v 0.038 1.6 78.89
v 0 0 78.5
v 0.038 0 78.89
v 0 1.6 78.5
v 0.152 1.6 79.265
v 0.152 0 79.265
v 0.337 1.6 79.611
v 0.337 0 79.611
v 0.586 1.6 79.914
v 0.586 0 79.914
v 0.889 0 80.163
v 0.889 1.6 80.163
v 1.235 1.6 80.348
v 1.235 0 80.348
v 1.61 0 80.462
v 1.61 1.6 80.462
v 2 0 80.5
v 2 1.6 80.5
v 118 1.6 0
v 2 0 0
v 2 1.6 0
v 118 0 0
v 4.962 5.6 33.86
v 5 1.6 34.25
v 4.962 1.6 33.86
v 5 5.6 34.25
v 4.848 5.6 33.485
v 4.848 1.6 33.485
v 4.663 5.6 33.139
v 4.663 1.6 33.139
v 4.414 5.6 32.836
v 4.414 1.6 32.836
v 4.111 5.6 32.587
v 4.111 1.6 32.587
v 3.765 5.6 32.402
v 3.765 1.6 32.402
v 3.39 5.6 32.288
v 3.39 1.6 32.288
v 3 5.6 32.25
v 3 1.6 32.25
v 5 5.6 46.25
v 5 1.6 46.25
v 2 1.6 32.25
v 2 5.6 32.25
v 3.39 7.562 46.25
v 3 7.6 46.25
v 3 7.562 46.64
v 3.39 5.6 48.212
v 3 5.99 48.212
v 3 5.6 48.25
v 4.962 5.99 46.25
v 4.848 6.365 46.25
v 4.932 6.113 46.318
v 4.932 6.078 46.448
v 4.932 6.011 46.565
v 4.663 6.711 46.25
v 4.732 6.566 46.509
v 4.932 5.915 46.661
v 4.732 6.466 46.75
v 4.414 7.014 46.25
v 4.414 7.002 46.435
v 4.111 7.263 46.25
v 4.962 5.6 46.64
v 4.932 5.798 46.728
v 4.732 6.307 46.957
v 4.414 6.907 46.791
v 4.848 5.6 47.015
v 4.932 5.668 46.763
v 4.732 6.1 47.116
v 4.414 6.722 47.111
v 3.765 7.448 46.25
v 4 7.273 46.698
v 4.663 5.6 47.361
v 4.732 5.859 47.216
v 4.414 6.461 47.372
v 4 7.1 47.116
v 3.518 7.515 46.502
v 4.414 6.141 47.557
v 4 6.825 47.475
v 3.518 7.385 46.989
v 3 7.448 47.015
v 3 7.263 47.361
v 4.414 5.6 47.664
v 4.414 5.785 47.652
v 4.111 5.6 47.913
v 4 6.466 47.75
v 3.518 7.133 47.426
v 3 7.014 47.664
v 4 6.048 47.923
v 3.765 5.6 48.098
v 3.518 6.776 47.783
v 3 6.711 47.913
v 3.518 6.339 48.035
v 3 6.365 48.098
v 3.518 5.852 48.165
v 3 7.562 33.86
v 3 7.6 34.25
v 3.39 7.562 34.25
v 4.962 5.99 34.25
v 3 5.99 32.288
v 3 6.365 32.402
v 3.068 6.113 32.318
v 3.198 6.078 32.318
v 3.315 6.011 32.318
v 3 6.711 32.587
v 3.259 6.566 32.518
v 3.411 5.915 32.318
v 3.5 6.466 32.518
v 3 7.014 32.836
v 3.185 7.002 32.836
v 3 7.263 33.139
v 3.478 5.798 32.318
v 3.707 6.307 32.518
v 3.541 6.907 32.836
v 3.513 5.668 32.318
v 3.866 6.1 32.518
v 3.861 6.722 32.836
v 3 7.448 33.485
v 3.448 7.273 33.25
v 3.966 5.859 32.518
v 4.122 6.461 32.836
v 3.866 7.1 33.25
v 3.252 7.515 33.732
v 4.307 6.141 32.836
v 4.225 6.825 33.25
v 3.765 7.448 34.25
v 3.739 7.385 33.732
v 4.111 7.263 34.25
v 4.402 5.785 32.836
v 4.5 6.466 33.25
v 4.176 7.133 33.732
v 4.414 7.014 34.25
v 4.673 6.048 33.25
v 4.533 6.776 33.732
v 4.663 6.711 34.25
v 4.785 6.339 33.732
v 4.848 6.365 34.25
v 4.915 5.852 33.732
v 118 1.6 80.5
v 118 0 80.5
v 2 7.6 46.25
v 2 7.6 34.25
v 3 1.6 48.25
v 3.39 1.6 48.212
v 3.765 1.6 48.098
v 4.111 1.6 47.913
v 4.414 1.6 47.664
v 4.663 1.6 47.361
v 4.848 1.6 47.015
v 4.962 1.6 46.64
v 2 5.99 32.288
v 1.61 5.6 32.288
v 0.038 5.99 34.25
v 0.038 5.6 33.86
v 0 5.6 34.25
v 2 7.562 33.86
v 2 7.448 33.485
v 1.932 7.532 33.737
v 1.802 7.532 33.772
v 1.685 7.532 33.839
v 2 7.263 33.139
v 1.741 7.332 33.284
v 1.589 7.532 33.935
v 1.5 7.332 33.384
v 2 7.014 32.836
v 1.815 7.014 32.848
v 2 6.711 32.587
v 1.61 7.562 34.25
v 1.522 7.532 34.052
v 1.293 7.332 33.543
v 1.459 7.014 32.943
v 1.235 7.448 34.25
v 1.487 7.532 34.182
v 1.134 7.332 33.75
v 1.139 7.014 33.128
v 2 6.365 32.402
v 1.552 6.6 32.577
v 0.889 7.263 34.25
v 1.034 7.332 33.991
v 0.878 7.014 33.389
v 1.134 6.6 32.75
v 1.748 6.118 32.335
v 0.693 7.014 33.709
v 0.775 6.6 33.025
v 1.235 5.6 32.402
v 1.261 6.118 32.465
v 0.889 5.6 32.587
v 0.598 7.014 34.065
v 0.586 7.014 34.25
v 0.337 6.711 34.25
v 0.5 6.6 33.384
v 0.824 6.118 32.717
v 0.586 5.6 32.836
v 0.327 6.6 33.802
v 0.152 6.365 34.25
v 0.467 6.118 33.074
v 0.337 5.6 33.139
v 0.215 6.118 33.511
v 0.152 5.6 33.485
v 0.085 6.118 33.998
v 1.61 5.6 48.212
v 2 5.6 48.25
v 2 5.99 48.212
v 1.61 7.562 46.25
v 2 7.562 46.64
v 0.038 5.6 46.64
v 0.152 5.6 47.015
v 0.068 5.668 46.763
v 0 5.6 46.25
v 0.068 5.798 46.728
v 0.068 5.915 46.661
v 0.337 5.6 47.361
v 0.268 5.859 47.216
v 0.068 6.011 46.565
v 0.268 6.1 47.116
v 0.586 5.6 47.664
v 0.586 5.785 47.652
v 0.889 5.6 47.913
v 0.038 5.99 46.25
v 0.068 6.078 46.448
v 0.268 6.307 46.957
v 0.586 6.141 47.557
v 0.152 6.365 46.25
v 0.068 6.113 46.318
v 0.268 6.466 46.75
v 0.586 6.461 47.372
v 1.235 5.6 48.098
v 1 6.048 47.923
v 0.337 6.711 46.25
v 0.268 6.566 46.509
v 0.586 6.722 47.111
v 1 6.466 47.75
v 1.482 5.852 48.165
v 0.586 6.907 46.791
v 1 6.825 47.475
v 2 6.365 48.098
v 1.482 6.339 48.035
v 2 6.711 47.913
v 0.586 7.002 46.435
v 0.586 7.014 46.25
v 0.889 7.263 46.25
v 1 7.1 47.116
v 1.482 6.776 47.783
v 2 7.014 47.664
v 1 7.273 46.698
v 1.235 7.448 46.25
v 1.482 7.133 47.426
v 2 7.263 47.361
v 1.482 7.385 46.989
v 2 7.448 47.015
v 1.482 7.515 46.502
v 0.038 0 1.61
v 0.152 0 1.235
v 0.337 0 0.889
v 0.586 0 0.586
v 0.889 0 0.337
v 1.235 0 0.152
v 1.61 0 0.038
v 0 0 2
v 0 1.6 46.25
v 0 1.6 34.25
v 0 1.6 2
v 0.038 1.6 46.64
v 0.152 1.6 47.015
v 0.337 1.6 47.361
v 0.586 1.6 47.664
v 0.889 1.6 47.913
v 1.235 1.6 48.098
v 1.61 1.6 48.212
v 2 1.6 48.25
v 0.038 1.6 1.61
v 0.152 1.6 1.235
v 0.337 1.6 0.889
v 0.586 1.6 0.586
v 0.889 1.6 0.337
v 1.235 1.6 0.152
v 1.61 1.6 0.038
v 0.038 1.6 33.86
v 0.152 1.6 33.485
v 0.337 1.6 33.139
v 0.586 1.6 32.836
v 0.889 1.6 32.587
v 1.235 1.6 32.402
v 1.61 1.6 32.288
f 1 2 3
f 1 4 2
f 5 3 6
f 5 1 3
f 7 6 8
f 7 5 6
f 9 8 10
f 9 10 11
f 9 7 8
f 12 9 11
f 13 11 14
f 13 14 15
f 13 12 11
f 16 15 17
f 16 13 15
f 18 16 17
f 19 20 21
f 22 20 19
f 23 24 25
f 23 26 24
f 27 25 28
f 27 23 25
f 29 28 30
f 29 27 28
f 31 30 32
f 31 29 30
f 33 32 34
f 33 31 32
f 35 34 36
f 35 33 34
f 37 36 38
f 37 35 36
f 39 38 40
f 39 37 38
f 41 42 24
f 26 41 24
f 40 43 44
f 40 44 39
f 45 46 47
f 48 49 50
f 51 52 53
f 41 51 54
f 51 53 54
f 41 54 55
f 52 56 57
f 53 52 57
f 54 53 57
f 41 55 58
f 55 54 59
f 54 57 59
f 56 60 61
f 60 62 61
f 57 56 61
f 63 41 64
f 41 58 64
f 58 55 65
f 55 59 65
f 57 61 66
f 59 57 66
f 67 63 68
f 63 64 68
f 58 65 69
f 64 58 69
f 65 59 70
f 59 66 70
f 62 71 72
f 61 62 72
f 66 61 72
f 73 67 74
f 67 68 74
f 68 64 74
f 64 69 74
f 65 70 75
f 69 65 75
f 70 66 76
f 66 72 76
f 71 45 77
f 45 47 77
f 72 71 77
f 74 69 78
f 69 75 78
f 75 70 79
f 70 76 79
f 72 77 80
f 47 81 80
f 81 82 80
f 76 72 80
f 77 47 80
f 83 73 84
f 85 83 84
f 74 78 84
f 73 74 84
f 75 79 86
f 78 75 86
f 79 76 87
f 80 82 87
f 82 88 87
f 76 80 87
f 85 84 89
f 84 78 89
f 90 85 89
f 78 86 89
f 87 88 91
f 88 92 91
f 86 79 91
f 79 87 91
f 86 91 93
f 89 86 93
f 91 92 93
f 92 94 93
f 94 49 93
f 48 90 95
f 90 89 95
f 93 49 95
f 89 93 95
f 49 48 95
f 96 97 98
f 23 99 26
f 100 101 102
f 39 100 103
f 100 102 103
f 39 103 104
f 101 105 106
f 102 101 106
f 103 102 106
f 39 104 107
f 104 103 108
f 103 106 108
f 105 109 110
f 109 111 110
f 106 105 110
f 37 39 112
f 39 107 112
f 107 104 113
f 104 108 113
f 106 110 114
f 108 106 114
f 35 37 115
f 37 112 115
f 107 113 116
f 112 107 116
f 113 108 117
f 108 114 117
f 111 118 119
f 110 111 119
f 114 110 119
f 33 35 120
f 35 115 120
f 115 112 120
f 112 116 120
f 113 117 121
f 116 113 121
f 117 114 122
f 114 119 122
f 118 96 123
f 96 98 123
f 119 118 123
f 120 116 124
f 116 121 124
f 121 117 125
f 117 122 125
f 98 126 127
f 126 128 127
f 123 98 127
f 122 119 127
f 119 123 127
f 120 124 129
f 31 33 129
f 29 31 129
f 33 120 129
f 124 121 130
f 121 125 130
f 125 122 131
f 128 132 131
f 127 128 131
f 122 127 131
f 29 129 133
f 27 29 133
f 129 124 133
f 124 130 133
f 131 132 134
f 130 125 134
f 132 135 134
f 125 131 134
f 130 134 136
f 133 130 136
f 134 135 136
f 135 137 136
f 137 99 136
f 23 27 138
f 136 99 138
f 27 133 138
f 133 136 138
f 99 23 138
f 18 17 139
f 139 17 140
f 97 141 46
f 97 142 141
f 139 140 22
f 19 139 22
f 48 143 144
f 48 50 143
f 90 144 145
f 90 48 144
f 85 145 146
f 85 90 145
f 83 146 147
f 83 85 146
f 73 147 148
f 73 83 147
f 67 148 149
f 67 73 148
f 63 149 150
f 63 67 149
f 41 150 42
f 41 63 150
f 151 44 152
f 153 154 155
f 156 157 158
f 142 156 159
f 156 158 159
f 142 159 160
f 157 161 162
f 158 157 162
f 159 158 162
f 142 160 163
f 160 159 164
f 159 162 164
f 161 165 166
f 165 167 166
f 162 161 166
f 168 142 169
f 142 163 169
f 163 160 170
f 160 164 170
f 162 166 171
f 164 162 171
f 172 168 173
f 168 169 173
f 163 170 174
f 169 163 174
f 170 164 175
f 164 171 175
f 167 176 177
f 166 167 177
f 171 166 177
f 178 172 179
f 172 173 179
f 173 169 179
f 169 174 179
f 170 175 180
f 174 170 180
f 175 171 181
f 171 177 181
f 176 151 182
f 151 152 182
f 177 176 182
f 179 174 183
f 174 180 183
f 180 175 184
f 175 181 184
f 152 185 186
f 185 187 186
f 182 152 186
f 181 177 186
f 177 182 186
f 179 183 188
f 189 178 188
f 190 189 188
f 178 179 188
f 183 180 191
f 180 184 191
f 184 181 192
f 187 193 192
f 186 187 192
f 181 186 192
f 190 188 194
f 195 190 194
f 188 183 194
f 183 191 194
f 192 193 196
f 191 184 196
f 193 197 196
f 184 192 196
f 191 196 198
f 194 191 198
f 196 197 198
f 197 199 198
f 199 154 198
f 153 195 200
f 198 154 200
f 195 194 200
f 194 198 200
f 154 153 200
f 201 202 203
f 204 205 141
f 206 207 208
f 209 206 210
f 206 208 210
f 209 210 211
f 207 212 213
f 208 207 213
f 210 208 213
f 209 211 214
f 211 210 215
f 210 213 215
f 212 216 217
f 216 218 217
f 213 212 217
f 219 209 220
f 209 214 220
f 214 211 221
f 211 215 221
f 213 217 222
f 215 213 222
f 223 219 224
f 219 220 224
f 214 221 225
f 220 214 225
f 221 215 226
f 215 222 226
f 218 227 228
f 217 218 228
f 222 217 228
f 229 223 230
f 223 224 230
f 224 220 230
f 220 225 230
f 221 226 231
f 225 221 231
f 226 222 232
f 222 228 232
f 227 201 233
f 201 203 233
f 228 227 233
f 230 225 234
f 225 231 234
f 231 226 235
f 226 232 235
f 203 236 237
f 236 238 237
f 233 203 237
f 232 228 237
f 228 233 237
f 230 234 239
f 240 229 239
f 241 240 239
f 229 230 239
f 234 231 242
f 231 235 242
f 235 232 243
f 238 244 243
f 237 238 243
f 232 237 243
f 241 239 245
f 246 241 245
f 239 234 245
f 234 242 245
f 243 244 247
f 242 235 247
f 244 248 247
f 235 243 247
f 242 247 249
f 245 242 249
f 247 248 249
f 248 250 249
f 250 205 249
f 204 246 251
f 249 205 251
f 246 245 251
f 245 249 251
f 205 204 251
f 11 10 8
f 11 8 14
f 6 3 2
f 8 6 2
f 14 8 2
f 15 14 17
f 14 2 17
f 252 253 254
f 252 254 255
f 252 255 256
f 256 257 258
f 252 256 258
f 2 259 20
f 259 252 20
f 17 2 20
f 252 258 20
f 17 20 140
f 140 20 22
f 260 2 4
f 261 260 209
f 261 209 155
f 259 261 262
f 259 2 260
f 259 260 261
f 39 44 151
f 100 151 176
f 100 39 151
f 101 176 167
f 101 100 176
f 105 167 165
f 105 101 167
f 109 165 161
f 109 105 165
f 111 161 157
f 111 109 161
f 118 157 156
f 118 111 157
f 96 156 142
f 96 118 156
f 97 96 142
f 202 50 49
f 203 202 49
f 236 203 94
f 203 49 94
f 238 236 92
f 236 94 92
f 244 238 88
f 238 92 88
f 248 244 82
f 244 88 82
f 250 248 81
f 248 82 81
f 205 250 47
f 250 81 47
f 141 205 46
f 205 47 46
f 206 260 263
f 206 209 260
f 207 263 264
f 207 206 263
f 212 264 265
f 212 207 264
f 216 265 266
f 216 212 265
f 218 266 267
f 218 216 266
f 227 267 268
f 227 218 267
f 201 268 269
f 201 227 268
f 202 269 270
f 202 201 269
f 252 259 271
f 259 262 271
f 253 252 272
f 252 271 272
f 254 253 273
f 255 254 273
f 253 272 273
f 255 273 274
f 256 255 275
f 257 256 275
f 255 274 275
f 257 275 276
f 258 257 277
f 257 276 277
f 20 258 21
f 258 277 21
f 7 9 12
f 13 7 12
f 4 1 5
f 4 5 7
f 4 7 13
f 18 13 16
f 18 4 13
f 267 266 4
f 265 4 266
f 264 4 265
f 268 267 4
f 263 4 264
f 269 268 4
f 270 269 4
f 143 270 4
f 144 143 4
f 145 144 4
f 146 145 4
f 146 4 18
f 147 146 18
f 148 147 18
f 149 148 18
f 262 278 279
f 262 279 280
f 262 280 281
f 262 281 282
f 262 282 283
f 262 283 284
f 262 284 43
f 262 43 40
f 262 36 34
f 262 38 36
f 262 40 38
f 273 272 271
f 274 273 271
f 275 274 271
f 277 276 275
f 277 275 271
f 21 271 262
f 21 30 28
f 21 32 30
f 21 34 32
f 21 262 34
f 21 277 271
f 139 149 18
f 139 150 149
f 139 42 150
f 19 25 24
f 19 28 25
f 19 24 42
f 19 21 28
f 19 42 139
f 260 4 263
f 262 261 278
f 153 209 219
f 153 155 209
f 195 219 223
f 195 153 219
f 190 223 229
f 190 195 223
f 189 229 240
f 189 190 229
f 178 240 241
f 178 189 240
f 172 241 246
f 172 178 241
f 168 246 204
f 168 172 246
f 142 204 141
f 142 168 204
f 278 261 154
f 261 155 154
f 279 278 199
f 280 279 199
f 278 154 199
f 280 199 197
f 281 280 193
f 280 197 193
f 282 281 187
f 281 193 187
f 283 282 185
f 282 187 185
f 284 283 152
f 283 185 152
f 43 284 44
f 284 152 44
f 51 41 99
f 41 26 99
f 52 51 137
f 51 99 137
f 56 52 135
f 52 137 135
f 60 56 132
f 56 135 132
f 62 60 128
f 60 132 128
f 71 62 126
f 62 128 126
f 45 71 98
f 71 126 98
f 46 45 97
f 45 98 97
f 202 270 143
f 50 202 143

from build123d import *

# Parameters (mm, degrees)
SKETCH1_W           = 118
SKETCH1_H           = 80.5
LID_EXTRUDE_DEPTH   = 1.6
LID_EDGE_FILLET_R   = 2
SKETCH2_W           = 5
SKETCH2_H           = 16
BOSS_EXTRUDE2_DEPTH = 6
FILLET2_R           = 2


with BuildPart() as part:
    # Sketch1 → lid extrude (new body)
    with BuildSketch(Plane(origin=(0, 0, 0), x_dir=(1, 0, 0), z_dir=(0, 1, 0))):
        with Locations((59, -40.25)):
            Rectangle(SKETCH1_W, SKETCH1_H)
    extrude(amount=LID_EXTRUDE_DEPTH)

    # lid edge fillet
    lid_edge_fillet_edges = [part.edges().sort_by_distance(p)[0] for p in [
        (0, 0.8, 0),
        (0, 0.8, 80.5),
    ]]
    fillet(lid_edge_fillet_edges, radius=LID_EDGE_FILLET_R)

    # Sketch2 → Boss-Extrude2 (add)
    with BuildSketch(Plane(origin=(0, 1.6, 0), x_dir=(1, 0, 0), z_dir=(0, 1, 0))):
        with Locations((2.5, -40.25)):
            Rectangle(SKETCH2_W, SKETCH2_H)
    extrude(amount=BOSS_EXTRUDE2_DEPTH)

    # Fillet2
    fillet2_edges = [part.edges().sort_by_distance(p)[0] for p in [
        (0, 4.6, 32.25),
        (2.5, 7.6, 48.25),
        (0, 4.6, 48.25),
        (5, 7.6, 40.25),
        (5, 4.6, 48.25),
        (2.5, 7.6, 32.25),
        (5, 4.6, 32.25),
        (0, 7.6, 40.25),
    ]]
    fillet(fillet2_edges, radius=FILLET2_R)


solid = part.part
